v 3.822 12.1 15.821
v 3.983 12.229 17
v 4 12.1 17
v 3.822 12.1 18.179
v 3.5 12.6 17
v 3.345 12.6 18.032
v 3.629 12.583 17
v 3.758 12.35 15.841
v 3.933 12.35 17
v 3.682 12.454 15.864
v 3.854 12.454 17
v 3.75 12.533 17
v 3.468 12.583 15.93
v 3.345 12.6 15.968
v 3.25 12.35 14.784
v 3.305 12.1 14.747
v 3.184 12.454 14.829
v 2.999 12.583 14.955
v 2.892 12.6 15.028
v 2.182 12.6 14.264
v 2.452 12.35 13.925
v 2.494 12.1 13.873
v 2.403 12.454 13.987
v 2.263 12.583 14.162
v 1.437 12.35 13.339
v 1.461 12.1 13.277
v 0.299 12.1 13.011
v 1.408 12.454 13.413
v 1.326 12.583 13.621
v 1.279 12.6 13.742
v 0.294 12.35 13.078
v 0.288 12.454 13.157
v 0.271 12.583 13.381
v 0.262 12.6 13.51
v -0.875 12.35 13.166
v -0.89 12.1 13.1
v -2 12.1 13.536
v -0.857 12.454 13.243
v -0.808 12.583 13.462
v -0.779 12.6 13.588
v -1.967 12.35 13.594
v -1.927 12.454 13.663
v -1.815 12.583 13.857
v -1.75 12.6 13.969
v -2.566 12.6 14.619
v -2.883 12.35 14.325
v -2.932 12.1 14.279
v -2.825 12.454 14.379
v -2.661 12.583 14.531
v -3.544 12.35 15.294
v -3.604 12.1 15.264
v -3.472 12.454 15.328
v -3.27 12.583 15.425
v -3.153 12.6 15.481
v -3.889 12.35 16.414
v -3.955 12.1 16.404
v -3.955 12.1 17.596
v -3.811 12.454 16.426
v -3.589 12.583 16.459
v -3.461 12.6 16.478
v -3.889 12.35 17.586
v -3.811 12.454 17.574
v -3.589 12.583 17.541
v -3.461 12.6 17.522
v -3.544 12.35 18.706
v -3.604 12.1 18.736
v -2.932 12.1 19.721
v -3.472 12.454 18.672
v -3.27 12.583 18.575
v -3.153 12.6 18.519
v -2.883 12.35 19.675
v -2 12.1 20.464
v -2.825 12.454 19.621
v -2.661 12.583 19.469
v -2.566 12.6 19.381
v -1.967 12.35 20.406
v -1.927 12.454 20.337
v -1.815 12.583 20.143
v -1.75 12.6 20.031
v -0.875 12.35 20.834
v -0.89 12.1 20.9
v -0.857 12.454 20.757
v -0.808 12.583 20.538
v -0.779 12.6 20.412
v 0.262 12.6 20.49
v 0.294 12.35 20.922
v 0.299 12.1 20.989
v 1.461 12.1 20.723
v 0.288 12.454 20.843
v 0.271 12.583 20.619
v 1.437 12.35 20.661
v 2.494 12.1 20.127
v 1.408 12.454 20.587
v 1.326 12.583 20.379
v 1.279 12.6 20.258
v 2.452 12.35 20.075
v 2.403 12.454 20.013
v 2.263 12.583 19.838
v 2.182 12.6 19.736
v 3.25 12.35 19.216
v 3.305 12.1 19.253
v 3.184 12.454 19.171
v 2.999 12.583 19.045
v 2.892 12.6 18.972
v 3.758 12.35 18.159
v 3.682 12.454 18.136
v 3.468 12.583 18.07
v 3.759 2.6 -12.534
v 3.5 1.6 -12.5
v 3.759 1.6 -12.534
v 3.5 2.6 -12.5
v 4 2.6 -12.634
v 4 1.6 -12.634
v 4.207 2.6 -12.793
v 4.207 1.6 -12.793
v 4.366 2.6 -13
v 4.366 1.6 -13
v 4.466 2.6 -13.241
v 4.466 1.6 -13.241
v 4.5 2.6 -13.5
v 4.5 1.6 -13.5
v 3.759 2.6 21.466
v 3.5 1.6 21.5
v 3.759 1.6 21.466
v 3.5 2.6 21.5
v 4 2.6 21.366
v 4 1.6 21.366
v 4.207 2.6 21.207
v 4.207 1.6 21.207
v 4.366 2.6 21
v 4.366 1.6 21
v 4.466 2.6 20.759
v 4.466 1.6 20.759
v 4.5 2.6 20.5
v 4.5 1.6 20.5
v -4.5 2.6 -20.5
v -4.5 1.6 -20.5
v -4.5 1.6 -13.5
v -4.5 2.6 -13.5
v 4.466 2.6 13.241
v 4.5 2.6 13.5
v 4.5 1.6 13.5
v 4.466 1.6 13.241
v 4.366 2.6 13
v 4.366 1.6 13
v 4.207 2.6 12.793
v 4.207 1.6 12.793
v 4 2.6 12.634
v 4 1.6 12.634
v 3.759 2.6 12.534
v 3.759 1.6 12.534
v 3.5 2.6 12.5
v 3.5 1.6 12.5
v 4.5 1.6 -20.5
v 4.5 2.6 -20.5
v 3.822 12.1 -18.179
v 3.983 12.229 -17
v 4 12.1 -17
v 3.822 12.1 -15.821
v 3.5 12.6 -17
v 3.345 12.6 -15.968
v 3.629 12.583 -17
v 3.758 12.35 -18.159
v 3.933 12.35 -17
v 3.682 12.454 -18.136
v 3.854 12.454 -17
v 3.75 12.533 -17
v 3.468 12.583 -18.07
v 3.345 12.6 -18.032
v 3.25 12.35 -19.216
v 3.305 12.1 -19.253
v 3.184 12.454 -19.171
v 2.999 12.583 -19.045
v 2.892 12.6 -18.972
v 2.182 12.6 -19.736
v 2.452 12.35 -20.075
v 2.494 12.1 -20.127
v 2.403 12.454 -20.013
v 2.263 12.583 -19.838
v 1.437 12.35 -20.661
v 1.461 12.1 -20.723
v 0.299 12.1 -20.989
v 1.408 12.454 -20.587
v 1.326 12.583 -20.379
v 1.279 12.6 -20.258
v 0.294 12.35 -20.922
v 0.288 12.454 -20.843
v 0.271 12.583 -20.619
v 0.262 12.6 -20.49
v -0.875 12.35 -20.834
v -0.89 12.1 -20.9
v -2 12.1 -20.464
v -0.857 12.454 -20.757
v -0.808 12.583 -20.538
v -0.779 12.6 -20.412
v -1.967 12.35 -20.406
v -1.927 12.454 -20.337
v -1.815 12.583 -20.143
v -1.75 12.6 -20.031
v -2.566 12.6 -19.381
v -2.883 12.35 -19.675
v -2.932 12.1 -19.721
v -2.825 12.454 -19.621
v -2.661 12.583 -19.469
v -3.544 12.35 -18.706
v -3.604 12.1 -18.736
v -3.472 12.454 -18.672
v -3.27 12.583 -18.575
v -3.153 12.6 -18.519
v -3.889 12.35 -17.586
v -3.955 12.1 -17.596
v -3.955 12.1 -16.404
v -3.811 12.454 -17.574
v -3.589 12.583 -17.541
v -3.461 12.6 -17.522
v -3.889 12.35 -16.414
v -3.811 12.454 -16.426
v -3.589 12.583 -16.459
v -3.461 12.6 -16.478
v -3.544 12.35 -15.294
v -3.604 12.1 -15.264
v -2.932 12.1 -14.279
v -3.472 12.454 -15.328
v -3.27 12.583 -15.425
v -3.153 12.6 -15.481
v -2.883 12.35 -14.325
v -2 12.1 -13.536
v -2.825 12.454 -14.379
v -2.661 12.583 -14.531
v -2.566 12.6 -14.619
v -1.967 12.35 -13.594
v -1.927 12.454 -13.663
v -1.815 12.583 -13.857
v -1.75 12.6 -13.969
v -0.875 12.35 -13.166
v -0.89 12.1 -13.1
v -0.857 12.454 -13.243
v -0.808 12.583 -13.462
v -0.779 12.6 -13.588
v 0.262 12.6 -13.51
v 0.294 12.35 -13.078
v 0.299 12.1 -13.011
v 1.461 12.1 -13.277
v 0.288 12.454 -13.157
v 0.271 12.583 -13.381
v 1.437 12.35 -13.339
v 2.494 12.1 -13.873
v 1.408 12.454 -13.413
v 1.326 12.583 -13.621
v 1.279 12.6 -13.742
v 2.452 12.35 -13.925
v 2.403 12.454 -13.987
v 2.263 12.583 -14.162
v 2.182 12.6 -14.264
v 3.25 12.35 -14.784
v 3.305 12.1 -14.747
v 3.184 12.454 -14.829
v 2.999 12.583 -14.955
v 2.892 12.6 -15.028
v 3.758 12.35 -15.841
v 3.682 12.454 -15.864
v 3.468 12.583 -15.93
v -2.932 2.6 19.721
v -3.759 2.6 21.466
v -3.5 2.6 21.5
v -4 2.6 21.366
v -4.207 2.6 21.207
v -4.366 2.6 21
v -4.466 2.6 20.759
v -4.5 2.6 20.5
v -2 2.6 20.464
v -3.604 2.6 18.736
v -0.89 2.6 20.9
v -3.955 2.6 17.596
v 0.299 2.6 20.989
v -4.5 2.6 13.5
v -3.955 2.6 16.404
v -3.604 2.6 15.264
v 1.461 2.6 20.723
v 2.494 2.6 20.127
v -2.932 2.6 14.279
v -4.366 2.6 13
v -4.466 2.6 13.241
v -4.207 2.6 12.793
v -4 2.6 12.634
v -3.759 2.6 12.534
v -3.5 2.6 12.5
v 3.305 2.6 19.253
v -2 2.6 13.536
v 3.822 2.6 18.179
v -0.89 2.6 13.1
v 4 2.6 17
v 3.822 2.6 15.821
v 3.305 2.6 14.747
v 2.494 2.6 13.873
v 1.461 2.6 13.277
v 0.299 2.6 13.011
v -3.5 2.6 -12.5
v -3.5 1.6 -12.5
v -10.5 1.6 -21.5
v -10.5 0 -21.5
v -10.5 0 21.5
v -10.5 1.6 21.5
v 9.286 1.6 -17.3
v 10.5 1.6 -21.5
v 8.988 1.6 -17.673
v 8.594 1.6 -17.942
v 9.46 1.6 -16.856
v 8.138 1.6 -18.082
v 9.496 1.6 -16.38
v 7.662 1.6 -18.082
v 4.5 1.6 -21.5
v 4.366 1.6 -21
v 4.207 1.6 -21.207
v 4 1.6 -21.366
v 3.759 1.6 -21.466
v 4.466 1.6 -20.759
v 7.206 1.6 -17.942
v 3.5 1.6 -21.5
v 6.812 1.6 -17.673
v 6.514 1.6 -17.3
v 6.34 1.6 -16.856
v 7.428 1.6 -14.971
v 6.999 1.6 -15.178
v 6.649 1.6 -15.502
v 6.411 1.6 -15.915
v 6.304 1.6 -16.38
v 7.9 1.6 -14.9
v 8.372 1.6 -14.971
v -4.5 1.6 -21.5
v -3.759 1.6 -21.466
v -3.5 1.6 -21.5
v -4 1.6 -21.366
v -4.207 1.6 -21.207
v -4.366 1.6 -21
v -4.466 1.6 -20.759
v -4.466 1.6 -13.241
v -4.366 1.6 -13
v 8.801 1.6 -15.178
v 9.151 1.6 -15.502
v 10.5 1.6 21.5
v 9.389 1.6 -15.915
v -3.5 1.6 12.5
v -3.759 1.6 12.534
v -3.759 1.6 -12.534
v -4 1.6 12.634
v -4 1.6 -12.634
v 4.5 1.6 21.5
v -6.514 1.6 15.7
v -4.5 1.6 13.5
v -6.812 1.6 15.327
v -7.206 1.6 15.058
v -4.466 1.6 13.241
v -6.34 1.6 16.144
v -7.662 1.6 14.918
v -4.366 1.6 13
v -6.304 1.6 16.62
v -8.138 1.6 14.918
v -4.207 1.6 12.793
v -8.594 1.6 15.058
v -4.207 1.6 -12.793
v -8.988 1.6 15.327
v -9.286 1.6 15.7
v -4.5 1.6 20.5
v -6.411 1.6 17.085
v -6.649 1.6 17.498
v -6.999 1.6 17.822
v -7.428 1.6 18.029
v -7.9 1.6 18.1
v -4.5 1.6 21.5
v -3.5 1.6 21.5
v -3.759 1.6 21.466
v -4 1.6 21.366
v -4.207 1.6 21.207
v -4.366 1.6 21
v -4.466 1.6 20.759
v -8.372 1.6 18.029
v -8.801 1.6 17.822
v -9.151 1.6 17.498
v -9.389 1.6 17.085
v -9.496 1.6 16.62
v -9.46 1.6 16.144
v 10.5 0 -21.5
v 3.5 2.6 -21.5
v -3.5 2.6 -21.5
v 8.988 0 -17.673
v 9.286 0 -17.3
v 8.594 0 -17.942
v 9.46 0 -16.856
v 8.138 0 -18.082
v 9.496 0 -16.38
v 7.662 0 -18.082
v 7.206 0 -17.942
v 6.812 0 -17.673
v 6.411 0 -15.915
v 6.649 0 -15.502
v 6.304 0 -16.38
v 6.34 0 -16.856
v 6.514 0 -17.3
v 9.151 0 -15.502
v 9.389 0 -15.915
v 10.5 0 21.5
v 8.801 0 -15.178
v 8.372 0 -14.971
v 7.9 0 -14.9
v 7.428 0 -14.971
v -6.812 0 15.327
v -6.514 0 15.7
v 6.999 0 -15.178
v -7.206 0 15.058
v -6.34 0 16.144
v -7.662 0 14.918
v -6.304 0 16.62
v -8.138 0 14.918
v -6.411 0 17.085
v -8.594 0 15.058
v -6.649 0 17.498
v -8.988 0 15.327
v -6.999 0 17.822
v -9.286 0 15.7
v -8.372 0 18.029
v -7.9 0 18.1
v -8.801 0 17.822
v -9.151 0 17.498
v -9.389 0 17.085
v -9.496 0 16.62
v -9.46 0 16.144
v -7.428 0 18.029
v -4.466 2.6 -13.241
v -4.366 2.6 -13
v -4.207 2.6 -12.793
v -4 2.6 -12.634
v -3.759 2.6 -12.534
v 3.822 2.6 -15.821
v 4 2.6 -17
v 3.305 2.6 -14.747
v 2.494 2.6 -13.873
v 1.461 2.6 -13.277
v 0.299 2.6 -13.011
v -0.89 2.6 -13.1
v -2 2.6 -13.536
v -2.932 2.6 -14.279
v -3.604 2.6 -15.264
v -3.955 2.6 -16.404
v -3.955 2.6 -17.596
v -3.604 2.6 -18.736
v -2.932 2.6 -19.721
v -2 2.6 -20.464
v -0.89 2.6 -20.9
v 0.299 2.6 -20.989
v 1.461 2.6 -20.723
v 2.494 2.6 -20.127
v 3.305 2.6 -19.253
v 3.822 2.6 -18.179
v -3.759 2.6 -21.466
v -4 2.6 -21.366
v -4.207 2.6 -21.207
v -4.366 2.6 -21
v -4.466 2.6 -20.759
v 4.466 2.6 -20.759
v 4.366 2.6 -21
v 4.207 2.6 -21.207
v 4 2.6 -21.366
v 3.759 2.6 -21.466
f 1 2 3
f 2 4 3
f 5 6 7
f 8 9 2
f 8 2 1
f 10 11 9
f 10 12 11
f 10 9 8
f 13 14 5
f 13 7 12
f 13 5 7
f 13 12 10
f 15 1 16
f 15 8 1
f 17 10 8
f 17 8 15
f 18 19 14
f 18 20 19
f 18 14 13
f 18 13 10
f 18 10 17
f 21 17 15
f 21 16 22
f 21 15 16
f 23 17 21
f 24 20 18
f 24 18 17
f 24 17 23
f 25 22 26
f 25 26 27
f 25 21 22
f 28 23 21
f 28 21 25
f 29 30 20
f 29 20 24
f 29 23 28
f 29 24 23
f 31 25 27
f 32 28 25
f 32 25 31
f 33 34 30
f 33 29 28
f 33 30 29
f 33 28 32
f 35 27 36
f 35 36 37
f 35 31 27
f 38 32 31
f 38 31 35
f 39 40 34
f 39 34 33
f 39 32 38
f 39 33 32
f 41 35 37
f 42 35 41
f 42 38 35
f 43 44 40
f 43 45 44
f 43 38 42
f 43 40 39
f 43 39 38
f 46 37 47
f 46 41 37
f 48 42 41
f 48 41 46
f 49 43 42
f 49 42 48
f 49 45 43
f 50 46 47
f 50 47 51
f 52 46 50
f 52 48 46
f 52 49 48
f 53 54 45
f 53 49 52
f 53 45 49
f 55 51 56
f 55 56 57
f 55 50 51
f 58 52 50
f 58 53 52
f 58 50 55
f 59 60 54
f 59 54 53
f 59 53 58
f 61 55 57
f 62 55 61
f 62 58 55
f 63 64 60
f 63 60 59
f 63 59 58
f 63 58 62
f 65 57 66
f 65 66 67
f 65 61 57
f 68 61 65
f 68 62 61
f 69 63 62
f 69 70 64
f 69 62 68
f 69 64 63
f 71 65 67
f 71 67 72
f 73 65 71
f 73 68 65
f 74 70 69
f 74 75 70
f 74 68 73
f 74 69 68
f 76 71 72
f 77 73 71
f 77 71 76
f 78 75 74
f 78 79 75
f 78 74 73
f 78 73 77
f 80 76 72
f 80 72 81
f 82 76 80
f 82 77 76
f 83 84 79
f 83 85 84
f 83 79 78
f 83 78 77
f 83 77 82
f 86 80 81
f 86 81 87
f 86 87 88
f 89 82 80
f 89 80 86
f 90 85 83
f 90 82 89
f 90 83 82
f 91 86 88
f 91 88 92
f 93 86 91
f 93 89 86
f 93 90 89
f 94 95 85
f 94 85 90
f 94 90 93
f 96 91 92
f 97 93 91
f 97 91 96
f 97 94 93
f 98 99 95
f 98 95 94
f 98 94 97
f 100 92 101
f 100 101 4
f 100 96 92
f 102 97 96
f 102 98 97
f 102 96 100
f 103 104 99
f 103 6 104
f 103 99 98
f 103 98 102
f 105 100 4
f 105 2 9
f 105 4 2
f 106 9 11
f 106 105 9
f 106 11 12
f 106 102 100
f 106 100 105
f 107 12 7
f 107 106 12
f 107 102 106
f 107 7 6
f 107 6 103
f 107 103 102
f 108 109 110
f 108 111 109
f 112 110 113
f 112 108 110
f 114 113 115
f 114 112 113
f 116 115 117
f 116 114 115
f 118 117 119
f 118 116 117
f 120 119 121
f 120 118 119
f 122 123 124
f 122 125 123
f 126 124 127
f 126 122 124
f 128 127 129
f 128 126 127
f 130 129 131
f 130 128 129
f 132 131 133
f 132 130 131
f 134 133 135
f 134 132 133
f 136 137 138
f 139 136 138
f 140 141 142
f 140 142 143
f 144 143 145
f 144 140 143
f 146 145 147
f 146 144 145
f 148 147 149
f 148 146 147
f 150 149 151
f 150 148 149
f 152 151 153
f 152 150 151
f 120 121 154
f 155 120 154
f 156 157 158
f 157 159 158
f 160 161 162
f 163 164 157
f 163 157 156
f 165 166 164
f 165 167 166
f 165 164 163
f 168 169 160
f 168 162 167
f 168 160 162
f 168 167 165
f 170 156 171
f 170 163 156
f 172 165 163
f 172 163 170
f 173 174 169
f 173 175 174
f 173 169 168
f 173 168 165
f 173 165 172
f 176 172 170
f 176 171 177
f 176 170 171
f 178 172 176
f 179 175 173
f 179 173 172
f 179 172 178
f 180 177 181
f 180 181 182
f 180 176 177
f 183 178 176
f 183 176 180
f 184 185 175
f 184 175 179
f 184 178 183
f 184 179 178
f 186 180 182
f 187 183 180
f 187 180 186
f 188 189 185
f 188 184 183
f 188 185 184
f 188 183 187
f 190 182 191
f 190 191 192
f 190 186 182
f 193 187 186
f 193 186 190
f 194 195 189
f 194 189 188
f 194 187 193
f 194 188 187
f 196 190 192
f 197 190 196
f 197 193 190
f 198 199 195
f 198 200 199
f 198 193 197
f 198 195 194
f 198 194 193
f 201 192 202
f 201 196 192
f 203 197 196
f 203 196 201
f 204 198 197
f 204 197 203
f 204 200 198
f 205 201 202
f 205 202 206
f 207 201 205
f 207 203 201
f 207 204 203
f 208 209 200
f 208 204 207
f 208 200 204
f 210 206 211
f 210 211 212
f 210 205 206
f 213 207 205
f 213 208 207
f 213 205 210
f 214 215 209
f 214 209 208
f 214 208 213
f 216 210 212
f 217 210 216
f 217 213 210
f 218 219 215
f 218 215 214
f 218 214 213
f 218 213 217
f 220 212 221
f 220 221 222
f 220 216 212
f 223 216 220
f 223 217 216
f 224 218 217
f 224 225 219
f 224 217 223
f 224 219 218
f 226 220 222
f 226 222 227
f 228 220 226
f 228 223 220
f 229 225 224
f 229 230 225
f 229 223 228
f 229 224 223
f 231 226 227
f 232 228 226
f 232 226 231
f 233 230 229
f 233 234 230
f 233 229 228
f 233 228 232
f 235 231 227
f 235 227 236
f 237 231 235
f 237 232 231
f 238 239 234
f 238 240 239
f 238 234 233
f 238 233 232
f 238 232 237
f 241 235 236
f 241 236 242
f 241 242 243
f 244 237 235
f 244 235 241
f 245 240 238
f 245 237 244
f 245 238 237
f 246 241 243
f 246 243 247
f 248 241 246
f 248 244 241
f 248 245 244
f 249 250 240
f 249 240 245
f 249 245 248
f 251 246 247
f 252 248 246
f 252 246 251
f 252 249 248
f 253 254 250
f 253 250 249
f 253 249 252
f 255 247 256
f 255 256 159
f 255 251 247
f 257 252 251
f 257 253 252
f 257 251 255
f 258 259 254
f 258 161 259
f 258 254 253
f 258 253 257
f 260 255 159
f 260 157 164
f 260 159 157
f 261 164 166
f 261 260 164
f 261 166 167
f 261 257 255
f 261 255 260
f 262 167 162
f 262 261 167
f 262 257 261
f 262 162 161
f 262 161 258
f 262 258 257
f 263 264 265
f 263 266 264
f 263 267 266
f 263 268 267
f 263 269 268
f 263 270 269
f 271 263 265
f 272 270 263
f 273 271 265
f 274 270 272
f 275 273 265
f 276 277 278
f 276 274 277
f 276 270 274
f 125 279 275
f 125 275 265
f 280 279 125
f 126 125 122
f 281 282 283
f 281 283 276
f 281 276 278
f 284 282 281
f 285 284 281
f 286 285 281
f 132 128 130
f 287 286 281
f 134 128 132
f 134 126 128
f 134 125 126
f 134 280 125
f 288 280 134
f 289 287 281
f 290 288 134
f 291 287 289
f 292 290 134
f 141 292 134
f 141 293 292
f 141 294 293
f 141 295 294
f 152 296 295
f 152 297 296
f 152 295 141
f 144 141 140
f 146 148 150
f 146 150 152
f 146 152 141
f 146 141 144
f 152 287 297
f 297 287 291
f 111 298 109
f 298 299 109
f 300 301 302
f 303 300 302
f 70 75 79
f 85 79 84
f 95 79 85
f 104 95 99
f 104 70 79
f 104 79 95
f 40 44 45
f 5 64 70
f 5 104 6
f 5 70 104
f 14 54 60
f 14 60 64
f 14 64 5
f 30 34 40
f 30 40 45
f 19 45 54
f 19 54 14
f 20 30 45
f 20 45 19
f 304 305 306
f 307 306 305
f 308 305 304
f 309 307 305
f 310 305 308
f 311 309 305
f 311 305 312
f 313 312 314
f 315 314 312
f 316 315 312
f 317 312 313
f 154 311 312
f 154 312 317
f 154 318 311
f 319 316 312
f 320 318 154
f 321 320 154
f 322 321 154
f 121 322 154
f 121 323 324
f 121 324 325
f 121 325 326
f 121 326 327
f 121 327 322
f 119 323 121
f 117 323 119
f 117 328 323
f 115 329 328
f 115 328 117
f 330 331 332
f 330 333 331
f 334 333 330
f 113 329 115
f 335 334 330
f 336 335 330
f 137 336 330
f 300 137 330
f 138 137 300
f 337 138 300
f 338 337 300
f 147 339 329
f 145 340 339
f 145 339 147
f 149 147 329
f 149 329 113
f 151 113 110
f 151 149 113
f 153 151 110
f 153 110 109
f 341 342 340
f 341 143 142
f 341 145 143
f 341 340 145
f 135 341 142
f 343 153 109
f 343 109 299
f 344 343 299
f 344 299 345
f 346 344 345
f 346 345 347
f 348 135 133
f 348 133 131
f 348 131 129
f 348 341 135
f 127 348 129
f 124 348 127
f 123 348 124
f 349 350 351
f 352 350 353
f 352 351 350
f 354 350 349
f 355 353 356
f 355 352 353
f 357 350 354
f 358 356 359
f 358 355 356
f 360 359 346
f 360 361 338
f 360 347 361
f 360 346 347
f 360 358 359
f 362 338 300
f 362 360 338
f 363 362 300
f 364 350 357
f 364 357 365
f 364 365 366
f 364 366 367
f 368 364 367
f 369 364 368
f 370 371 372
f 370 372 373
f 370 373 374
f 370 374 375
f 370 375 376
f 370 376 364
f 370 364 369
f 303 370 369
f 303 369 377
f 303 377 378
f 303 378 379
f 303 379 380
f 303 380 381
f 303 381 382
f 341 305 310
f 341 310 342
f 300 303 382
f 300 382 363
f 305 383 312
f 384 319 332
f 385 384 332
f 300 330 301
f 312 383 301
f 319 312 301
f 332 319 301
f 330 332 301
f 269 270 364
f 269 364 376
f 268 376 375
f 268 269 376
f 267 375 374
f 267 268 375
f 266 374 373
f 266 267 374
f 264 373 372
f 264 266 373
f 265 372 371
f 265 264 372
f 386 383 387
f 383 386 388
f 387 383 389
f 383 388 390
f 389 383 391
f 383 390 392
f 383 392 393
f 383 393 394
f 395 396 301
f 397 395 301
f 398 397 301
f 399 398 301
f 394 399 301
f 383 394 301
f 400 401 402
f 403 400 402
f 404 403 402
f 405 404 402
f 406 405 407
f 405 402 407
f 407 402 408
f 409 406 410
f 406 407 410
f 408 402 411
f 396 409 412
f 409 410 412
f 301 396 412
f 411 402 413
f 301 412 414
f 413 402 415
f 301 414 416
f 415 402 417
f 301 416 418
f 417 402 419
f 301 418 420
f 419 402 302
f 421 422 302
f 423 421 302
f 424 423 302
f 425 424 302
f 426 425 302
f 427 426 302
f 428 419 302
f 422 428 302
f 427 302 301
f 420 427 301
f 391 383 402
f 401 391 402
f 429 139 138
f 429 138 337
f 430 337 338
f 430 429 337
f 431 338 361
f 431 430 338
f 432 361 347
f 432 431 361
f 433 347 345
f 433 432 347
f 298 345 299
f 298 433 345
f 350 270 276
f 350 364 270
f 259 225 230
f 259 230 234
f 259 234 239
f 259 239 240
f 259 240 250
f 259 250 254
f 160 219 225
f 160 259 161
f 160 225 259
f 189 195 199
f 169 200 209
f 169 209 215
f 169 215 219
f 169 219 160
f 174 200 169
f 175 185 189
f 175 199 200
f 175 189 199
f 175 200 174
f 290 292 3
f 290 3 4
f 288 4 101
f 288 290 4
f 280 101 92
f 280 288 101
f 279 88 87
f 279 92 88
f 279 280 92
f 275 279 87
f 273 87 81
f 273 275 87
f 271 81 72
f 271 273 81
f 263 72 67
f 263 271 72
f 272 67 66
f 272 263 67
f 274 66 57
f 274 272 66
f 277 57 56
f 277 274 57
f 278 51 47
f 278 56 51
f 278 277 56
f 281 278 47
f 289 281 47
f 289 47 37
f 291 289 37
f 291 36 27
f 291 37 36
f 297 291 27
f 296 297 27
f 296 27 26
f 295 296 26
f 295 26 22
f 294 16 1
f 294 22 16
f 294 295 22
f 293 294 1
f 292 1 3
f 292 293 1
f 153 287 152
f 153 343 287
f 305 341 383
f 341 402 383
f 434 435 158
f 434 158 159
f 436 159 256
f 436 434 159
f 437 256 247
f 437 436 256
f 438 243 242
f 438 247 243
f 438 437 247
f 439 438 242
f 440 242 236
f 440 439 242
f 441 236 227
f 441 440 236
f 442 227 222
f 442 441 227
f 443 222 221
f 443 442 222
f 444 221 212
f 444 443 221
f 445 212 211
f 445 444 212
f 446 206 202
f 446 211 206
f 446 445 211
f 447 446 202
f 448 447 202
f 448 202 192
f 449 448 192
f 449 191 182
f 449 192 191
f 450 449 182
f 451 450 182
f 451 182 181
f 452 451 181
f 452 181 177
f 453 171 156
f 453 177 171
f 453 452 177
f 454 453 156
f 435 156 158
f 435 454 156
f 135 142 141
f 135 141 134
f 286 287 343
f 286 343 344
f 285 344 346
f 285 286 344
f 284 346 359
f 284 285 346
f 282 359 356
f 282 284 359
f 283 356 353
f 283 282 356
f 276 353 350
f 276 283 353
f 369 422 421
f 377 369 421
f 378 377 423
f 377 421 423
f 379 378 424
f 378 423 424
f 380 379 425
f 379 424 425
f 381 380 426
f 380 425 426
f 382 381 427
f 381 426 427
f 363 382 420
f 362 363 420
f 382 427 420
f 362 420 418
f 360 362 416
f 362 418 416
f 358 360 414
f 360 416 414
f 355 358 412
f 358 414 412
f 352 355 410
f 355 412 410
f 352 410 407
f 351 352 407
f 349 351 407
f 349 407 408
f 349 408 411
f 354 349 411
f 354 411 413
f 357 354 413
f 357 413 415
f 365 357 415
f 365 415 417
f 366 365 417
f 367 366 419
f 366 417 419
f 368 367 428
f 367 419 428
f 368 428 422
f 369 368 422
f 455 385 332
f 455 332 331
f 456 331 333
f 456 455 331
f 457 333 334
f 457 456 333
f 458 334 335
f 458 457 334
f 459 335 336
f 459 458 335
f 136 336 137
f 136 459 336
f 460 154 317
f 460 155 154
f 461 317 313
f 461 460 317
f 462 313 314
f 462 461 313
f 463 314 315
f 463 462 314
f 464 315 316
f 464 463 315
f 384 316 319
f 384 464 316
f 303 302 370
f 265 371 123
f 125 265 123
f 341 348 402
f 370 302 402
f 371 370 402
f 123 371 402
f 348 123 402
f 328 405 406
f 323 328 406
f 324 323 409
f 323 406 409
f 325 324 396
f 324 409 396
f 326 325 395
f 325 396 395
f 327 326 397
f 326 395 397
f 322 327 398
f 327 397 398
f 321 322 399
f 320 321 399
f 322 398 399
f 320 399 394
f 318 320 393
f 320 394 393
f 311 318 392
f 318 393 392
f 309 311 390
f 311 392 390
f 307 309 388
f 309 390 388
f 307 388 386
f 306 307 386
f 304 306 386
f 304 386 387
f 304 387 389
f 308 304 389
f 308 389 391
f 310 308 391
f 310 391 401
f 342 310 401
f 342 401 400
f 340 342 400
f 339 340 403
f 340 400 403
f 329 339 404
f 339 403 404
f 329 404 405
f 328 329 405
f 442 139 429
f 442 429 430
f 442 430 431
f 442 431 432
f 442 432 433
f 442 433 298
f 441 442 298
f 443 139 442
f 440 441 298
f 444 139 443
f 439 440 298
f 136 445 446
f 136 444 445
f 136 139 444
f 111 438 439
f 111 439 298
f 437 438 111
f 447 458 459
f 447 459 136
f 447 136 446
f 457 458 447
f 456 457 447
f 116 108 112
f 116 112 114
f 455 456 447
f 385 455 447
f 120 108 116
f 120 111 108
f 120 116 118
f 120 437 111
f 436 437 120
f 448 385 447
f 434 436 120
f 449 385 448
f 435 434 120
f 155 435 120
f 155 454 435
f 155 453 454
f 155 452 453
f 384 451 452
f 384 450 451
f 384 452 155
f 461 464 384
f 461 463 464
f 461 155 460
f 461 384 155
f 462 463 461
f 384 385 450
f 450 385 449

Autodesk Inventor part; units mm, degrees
ref_plane "YZ Plane" through (0, 0, 0) normal (1, 0, 0) x (0, 1, 0)
ref_plane "XZ Plane" through (0, 0, 0) normal (0, 1, 0) x (-1, 0, 0)
ref_plane "XY Plane" through (0, 0, 0) normal (0, 0, 1) x (1, 0, 0)
sketch "Sketch1" plane through (0, 0, 0) normal (0, 1, 0) x (-1, 0, 0)
  line L0 (-10.5, 21.5) -> (-10.5, -21.5)
  line L1 (-10.5, -21.5) -> (10.5, -21.5)
  line L2 (10.5, -21.5) -> (10.5, 21.5)
  line L3 (10.5, 21.5) -> (-10.5, 21.5)
  line L4 (-10.5, 21.5) -> (10.5, -21.5) construction
  line L5 (-10.5, -21.5) -> (10.5, 21.5) construction
  point P0 (0, 0)
  dimension "d0" = 43
  dimension "d1" = 21
extrude "Extrusion1" add sketch "Sketch1" along normal blind 1.6
sketch "Sketch2" plane through (0, 1.6, 0) normal (0, 1, 0) x (1, 0, 0)
  line L0 (0, -21.5) -> (0, -17)
  line L1 (4.5, -12.5) -> (4.5, -21.5)
  line L2 (4.5, -21.5) -> (-4.5, -21.5)
  line L3 (-4.5, -21.5) -> (-4.5, -12.5)
  line L4 (-4.5, -12.5) -> (4.5, -12.5)
  line L5 (4.5, -12.5) -> (-4.5, -21.5) construction
  line L6 (4.5, -21.5) -> (-4.5, -12.5) construction
  line L7 (-2.2008, 0) -> (2.1177, 0)
  line L8 (4.5, 12.5) -> (4.5, 21.5)
  line L9 (4.5, 21.5) -> (-4.5, 21.5)
  line L10 (-4.5, 21.5) -> (-4.5, 12.5)
  line L11 (-4.5, 12.5) -> (4.5, 12.5)
  point P0 (0, 0)
  dimension "d4" = 4.5
  dimension "d5" = 9
extrude "Extrusion2" add sketch "Sketch2" along normal blind 1
sketch "Sketch3" plane through (0, 2.6, 0) normal (0, 1, 0) x (1, 0, 0)
  circle A0 centre (0, -17) radius 4
  circle A1 centre (0, 17) radius 4
  point P0 (0, 0)
  dimension "d8" = 8
  dimension "d9" = 8
extrude "Extrusion3" add sketch "Sketch3" along normal blind 10
fillet "Fillet1" radius 0.5 2 edges at (-4, 12.6, 17) (-4, 12.6, -17)
sketch "Sketch4" plane through (0, 1.6, 0) normal (0, 1, 0) x (1, 0, 0)
  line L0 (-10.5, 21.5) -> (-10.5, -21.5) projected
  line L1 (-10.5, -21.5) -> (-10.5, -16.5)
  line L2 (-10.5, -16.5) -> (-9.5, -16.5)
  line L3 (-9.5, -16.5) -> (-7.9, -16.5)
  line L4 (10.5, 21.5) -> (4.5, 21.5) projected
  line L5 (10.5, 21.5) -> (10.5, 16.5)
  line L6 (10.5, -21.5) -> (10.5, 21.5) projected
  line L7 (10.5, 16.5) -> (9.5, 16.5)
  line L8 (9.5, 16.5) -> (7.9, 16.5)
  point P0 (0, 0)
  dimension "d13" = 5
  dimension "d14" = 1
  dimension "d15" = 1.6
  dimension "d16" = 5
  dimension "d17" = 1
  dimension "d18" = 1.6
hole "Hole1" at (-7.9, 1.6, 16.5) at (7.9, 1.6, -16.5) direction (0, -1, 0) diameter 3.2 end through all clearance for "Hex Head Cap Screw ISO 24017" size "M3" standard "ISO"
fillet "Fillet2" radius 1 8 edges at (4.5, 2.1, 12.5) (4.5, 2.1, -12.5) (-4.5, 2.1, -12.5) (4.5, 2.1, -21.5) (4.5, 2.1, 21.5) (-4.5, 2.1, 21.5) (-4.5, 2.1, 12.5) (-4.5, 2.1, -21.5)
properties part number "XTW-SY-8"
